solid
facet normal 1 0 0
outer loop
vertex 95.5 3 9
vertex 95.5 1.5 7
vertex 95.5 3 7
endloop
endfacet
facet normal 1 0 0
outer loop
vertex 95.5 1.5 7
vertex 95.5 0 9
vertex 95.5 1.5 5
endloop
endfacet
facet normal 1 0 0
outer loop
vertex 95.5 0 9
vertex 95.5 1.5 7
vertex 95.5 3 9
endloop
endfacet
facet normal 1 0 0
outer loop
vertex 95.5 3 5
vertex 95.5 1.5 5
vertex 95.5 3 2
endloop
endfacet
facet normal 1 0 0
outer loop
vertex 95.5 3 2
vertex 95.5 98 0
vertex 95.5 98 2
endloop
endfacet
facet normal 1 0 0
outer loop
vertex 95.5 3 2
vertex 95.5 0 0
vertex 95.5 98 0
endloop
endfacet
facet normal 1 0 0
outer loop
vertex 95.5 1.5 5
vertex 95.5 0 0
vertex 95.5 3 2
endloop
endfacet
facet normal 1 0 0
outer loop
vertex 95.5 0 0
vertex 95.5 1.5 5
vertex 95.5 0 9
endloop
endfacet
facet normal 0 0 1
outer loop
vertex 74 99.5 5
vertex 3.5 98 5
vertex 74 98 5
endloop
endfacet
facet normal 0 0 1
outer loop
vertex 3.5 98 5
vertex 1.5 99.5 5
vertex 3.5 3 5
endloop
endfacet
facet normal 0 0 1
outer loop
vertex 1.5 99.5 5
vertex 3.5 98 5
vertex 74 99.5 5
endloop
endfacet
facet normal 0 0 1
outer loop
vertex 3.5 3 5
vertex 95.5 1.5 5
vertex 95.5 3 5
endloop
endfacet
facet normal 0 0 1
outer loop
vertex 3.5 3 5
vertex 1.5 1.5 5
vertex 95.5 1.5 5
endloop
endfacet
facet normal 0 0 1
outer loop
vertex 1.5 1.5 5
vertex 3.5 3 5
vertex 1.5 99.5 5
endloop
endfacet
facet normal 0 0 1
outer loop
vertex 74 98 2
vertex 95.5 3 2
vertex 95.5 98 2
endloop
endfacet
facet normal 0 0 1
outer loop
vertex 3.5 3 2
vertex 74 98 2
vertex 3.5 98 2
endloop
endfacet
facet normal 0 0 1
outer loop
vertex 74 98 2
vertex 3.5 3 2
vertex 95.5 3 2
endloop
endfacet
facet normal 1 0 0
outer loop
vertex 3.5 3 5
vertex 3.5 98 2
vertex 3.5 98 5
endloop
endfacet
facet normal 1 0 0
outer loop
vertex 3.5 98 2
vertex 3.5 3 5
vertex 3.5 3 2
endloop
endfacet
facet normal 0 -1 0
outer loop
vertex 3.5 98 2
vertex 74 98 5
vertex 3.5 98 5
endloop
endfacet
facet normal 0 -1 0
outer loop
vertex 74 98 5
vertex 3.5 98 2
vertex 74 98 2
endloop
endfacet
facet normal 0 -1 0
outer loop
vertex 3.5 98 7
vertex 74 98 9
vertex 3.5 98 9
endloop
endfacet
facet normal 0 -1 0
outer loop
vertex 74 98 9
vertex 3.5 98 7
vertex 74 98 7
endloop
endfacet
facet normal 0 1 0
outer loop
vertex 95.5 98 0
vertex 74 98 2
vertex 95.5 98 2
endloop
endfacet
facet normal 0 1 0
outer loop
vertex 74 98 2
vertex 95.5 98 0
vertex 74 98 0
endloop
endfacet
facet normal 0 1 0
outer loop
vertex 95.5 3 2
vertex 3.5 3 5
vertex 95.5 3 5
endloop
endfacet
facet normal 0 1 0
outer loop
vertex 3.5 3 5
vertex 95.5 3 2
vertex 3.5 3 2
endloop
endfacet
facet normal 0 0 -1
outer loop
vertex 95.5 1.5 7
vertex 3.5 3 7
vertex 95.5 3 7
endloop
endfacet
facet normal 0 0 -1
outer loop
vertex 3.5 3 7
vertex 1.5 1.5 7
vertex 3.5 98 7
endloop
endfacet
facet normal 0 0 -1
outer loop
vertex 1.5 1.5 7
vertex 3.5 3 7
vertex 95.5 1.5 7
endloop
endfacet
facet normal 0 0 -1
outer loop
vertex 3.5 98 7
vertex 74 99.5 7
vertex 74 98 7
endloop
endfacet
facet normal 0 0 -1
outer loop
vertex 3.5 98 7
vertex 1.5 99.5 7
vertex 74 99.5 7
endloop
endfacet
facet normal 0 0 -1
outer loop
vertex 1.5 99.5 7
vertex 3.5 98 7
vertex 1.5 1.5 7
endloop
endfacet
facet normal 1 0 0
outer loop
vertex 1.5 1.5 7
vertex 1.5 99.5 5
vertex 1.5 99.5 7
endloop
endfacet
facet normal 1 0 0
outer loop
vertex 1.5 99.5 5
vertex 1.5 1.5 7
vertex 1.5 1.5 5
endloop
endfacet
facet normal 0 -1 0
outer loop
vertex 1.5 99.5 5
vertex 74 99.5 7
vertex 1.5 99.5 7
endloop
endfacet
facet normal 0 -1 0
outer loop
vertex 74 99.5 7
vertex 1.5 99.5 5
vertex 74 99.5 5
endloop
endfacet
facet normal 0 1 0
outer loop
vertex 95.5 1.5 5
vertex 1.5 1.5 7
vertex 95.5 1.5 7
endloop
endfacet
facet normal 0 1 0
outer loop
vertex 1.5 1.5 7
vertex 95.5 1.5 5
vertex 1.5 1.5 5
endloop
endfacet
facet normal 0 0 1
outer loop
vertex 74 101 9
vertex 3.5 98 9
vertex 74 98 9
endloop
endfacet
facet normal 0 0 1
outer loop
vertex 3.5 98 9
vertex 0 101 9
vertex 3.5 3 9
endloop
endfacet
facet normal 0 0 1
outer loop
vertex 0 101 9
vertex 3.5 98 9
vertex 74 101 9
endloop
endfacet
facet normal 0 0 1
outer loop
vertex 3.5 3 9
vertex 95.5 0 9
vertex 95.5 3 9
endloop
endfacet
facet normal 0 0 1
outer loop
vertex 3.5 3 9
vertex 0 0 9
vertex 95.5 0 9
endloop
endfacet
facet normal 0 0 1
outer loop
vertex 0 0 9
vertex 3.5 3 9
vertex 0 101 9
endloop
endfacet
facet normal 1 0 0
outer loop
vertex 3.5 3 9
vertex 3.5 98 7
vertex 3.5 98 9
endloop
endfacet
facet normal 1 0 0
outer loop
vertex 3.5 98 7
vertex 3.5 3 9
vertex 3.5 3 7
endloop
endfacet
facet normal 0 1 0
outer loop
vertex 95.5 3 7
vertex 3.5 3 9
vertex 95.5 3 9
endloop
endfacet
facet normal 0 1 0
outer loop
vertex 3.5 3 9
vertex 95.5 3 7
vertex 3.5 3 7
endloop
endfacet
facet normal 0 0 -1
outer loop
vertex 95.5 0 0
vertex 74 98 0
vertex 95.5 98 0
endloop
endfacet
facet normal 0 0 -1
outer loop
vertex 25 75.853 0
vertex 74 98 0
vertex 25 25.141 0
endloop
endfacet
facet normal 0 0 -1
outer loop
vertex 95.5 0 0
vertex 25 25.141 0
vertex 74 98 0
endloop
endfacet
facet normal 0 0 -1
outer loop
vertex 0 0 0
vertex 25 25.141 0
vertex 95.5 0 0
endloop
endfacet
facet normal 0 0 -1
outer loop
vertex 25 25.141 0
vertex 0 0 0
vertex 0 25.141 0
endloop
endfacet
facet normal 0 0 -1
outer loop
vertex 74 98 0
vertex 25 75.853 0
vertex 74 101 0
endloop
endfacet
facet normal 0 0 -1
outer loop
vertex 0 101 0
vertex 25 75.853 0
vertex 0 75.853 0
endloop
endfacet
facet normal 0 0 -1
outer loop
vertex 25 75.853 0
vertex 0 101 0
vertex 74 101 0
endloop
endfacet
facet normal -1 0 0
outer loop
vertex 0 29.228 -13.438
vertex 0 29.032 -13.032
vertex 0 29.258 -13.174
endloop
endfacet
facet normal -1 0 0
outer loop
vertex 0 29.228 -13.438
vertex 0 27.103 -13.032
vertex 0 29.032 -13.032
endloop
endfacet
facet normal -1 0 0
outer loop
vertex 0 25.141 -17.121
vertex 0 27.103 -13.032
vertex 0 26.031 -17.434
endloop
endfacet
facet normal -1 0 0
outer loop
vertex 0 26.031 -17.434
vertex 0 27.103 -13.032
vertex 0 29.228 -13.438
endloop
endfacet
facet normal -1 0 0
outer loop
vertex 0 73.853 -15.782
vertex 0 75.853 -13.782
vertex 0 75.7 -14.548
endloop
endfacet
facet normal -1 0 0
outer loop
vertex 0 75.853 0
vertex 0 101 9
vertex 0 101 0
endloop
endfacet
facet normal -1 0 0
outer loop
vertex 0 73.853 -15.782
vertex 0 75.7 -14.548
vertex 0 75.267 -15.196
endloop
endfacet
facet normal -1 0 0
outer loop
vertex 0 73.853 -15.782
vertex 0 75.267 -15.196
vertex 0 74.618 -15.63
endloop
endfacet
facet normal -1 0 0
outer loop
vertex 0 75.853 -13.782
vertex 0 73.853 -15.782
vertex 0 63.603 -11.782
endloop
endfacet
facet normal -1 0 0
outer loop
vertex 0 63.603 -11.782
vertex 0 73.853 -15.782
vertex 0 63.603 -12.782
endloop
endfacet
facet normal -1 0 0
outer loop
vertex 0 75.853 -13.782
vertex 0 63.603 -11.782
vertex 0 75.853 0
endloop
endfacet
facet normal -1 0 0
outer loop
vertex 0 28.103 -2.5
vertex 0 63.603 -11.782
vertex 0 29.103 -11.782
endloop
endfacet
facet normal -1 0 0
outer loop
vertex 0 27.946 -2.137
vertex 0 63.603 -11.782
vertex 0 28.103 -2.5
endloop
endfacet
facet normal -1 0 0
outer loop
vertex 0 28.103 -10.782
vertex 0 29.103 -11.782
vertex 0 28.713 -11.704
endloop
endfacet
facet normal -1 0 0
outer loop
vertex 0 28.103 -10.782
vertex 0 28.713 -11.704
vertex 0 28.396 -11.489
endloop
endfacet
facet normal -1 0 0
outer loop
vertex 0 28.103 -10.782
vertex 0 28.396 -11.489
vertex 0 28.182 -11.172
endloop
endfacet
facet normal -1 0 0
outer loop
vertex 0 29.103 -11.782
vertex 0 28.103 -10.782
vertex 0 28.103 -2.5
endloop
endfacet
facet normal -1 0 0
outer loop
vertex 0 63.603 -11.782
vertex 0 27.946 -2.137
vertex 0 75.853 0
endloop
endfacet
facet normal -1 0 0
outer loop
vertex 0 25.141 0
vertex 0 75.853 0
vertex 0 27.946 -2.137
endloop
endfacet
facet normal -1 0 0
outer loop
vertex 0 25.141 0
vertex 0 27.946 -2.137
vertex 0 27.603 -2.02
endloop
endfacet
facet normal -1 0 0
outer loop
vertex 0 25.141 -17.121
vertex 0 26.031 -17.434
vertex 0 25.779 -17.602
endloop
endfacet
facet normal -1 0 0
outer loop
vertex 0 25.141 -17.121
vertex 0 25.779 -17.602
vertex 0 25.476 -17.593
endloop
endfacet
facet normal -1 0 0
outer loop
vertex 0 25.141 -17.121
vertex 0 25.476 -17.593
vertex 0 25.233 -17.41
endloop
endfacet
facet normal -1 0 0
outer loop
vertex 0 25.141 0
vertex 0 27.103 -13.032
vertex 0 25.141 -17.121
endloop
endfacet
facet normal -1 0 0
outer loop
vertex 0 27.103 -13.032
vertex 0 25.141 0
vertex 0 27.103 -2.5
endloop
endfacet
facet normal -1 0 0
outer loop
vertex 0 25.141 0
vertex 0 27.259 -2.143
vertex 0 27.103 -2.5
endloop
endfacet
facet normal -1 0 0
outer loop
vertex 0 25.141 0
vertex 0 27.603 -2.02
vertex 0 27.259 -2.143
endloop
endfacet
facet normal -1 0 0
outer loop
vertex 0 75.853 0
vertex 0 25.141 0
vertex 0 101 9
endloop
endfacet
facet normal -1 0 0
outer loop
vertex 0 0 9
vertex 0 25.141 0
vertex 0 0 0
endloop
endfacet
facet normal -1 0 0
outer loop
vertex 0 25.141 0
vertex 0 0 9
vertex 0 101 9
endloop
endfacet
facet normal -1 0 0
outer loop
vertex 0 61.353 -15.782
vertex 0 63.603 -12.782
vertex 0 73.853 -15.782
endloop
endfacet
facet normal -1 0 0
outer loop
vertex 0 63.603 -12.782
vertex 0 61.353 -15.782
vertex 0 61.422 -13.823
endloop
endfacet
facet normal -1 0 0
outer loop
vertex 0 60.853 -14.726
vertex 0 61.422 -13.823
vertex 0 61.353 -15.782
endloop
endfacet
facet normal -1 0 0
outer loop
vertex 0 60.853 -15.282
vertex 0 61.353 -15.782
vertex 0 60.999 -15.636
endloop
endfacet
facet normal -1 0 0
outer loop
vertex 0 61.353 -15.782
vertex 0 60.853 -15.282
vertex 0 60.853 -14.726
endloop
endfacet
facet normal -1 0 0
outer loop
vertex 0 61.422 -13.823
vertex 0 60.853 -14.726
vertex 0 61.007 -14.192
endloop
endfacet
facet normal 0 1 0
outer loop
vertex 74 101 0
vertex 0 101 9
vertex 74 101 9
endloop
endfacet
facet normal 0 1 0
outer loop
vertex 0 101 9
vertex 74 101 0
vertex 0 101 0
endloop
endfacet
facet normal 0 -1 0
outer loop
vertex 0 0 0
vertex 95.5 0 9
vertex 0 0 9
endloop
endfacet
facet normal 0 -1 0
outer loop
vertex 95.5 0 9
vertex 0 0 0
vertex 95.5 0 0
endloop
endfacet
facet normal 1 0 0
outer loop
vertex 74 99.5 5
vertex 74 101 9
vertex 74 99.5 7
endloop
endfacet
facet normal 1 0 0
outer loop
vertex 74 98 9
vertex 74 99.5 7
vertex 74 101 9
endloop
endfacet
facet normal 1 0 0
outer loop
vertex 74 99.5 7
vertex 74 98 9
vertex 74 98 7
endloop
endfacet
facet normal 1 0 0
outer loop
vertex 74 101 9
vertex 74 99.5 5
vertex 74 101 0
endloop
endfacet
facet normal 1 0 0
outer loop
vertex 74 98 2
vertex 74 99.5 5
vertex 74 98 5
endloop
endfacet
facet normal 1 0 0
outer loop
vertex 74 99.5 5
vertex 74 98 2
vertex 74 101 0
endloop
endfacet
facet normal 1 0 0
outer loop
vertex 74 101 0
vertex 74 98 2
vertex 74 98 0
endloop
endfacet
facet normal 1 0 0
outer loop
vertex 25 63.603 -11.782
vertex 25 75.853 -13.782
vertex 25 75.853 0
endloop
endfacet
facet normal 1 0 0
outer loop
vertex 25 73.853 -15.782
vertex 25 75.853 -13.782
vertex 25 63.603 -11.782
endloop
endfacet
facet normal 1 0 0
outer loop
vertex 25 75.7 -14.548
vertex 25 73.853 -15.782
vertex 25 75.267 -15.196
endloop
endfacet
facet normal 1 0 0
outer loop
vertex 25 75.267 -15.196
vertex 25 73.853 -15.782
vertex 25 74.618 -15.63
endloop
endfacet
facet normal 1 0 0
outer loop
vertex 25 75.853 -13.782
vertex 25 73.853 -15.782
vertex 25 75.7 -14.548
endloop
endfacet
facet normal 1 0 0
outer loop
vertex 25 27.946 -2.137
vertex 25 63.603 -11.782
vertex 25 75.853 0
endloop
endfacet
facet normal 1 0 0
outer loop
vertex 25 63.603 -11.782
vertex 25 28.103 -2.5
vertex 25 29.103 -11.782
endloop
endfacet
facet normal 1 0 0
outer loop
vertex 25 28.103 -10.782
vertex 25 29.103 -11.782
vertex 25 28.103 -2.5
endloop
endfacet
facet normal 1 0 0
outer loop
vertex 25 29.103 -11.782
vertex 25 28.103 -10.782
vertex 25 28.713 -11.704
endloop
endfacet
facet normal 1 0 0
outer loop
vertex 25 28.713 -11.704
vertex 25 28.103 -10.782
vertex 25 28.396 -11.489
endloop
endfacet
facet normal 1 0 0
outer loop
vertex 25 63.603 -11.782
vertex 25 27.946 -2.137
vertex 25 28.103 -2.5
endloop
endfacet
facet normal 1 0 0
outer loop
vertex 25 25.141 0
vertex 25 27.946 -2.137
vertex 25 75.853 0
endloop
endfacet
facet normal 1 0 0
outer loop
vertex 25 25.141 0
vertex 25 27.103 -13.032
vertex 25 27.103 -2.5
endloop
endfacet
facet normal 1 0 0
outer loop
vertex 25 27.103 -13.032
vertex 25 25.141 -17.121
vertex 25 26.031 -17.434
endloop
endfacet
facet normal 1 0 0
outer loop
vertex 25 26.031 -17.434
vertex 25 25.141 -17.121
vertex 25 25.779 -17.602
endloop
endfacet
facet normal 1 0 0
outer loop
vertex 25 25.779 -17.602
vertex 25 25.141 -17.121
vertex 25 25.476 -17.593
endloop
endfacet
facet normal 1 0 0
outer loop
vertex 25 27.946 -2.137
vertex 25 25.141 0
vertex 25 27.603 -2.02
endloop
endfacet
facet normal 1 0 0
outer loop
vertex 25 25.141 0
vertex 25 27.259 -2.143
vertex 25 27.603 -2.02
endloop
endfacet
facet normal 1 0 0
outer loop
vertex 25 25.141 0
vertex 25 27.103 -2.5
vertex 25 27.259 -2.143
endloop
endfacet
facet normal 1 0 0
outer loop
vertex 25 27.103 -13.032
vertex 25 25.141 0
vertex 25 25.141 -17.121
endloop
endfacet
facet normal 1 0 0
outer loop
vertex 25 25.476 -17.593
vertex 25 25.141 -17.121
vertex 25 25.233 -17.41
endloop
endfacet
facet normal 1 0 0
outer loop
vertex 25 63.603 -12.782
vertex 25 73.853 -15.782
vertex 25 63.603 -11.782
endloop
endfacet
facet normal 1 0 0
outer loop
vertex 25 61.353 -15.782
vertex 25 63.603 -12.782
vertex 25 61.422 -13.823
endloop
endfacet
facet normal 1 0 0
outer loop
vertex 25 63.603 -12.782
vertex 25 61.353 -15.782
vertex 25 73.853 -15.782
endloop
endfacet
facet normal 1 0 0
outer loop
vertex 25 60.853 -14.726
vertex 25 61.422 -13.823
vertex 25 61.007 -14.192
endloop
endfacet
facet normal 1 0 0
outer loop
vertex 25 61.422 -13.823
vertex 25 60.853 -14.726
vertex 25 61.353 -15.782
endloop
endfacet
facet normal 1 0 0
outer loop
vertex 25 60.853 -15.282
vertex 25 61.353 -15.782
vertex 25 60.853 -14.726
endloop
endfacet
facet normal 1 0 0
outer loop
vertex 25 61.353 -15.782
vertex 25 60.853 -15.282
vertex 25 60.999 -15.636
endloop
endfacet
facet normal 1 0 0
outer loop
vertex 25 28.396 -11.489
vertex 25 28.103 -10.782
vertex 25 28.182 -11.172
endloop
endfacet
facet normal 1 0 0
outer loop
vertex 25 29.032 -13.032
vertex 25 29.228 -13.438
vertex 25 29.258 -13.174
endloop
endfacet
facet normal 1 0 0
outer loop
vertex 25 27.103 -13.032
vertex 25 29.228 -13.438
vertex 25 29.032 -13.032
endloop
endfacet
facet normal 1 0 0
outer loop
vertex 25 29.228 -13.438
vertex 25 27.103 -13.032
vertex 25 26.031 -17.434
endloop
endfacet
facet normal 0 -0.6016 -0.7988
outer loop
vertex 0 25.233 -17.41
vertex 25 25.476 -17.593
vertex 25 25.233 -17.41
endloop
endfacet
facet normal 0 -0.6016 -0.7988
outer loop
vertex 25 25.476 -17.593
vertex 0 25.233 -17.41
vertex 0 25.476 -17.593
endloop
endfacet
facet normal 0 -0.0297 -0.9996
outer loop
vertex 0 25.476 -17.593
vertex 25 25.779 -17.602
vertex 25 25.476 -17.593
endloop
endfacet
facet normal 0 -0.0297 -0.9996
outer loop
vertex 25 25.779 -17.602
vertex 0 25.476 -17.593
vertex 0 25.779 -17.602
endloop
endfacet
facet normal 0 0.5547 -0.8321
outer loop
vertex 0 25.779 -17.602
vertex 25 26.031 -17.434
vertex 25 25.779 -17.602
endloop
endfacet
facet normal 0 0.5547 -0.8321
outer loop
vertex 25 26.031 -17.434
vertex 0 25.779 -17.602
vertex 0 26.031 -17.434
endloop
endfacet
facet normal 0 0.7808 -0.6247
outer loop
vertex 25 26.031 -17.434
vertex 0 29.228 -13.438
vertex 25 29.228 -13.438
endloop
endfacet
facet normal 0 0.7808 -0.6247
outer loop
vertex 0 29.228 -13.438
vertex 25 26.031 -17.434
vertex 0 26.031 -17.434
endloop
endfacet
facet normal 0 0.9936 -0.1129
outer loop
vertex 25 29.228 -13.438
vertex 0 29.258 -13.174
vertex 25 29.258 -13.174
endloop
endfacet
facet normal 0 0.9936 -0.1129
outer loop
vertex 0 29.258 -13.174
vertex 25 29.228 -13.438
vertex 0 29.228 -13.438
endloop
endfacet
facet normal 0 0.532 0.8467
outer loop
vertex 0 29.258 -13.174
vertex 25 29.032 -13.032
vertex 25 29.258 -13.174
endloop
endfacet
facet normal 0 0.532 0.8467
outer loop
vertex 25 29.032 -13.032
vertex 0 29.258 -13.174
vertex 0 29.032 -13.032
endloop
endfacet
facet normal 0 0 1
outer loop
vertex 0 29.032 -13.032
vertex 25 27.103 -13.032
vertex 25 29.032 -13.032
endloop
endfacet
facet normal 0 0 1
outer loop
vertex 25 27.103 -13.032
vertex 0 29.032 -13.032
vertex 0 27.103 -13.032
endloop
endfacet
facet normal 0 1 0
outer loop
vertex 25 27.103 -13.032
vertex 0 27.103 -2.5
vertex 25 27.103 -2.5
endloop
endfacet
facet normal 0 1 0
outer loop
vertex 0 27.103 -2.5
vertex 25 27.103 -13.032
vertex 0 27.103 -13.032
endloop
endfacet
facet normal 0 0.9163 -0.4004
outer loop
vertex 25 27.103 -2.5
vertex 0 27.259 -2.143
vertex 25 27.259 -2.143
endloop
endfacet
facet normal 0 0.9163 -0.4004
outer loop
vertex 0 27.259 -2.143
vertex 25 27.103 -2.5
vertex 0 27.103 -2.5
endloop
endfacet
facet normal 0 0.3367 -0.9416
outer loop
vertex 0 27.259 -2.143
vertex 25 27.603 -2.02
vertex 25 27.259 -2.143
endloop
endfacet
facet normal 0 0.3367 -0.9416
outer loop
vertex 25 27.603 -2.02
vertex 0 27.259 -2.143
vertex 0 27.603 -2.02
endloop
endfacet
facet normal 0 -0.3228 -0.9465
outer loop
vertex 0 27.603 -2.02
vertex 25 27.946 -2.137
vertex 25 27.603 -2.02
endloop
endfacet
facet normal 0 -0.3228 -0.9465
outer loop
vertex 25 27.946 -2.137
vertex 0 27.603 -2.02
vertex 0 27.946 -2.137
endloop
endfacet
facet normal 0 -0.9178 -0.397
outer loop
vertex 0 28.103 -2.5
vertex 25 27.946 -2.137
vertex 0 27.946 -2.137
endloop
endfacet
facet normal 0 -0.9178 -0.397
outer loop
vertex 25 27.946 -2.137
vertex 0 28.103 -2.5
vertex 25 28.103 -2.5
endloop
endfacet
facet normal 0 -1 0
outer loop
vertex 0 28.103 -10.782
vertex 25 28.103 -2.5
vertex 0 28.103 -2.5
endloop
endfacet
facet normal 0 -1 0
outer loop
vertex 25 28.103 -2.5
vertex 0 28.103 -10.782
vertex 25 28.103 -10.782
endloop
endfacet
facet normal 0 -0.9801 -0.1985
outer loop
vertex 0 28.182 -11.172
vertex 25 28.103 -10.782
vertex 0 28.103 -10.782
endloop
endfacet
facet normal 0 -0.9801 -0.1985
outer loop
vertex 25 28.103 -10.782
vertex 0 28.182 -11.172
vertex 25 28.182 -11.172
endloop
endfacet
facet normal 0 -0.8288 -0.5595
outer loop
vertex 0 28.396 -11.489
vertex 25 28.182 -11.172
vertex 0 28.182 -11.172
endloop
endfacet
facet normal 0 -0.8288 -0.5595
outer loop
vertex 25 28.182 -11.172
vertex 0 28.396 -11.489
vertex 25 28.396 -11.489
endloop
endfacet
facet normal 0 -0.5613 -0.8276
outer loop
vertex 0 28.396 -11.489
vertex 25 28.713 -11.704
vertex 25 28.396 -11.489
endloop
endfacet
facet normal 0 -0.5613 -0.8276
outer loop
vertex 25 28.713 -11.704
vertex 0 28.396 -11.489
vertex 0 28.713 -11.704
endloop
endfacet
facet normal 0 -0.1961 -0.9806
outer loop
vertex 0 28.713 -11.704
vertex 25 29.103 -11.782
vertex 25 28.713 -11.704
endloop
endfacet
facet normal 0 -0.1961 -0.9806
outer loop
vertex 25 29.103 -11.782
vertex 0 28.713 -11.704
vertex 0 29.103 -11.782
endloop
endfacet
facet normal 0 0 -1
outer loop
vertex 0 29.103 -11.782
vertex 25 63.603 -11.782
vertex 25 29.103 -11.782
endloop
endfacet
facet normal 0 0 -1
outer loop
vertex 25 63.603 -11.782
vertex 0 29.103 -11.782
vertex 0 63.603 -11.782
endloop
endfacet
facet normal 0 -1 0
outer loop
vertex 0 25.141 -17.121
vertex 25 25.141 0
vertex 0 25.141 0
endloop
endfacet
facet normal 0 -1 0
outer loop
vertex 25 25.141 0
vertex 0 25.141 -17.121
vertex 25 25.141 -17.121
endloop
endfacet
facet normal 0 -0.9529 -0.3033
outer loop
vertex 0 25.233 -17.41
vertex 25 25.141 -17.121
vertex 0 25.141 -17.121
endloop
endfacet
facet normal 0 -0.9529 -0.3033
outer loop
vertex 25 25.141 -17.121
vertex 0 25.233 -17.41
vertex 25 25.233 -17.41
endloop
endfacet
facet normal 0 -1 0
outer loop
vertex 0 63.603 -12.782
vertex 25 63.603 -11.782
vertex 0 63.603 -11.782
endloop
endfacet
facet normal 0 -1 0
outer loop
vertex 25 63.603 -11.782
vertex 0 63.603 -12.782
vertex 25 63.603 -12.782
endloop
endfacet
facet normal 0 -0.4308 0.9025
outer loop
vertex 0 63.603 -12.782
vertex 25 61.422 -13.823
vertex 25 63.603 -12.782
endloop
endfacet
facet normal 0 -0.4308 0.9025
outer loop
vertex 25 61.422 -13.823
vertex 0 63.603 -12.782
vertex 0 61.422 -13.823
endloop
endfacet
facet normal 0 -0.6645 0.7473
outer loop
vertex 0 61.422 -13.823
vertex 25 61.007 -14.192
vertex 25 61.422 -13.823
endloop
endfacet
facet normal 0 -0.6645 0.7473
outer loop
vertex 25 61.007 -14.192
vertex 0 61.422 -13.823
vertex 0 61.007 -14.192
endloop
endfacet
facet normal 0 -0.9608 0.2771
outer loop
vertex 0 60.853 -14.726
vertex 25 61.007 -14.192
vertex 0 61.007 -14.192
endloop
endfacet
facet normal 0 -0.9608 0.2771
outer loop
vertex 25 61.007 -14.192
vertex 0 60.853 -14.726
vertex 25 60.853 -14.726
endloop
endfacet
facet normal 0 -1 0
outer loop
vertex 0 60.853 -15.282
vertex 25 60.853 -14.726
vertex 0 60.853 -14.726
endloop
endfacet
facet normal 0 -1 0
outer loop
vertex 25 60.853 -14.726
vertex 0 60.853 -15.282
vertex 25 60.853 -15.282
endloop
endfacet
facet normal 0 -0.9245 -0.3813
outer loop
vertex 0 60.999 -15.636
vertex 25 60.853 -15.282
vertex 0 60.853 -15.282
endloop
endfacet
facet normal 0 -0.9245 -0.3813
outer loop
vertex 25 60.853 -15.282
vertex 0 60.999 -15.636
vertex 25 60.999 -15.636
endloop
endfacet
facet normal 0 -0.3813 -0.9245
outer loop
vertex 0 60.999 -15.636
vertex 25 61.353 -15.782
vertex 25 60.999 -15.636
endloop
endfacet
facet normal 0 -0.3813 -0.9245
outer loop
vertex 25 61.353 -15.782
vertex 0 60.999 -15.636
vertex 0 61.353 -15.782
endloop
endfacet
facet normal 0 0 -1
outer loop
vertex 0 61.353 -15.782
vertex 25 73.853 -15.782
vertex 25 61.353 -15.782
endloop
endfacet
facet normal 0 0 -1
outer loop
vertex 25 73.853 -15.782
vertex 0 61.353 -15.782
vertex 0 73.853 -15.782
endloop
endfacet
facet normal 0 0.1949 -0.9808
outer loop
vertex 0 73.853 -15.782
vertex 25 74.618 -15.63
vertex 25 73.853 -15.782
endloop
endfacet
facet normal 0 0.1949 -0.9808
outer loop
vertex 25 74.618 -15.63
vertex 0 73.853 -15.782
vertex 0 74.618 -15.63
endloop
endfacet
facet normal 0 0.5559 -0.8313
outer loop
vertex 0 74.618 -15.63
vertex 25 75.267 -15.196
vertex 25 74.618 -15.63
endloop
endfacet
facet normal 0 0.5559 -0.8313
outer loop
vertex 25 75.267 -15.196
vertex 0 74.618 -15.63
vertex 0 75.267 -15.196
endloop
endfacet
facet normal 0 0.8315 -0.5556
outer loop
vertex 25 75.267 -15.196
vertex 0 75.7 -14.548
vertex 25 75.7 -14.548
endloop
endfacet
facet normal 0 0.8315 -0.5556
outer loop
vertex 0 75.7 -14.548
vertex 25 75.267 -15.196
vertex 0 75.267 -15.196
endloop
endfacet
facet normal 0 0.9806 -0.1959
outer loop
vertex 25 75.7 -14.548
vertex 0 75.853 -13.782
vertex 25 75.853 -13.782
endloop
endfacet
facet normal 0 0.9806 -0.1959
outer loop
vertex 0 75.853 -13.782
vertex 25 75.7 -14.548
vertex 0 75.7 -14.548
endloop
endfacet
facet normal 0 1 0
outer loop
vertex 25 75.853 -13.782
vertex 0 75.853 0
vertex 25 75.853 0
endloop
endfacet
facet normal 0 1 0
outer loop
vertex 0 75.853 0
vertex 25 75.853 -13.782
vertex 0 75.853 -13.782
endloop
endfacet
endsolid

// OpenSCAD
// file: ../library/din_clip_01.scad
CLIP_H = 10;
HOLE_DEPTH = 9;
HOLE_DIAMETER = 2.9;

module din_clip(h=CLIP_H, grow=1) {
        intersection() {
        translate([0,0,-h/2]) cube([20,20,h]);
		linear_extrude(height=h, center=true, convexity=5) {
			import(file="din_clip_01.dxf", layer="0", $fn=64);
		}
    }
        translate([0,grow,0]) intersection() {
        translate([0,20-grow,-h/2]) cube([20,40,h]);
		linear_extrude(height=h, center=true, convexity=5) {
			import(file="din_clip_01.dxf", layer="0", $fn=64);
		}
    }
}

din_clip();
// main file
use <../library/din_clip_01.scad>

PCB_HEIGHT=98;
PCB_WIDTH1=94;
PCB_WIDTH2=96;
PCB_T =2;
PCB_FREE_SPACE=74;
T=2;

module half(width) {
difference() {
    cube([width+1.5,PCB_HEIGHT+3,3+3*T]);
    translate([1.5,1.5,T]) union() { 
        translate([2,1.5,0]) cube([width-2, PCB_HEIGHT-3, 3]);
        translate([0,0,3])cube([width, PCB_HEIGHT, T]);
        translate([2,1.5,3+T]) cube([width-2, PCB_HEIGHT-3, T]);
    }
    translate([PCB_FREE_SPACE,PCB_HEIGHT,0]) cube([width-PCB_FREE_SPACE+1.5,3,3+3*T]);
}
}

half(PCB_WIDTH1);
//translate([0,25,22]) half(PCB_WIDTH1);
//translate([PCB_WIDTH1+PCB_WIDTH2+20,0,0]) mirror([1,0,0]) half(PCB_WIDTH2);
/*
difference() {
cube([T,PCB_HEIGHT+25+3,22+3+3*T]);
color("red") translate([0,0,3+3*T]) rotate([-48.5,0,0]) translate([0,-20,0]) cube([2,20,50]);
color("red") translate([0,PCB_WIDTH2+16.24,-14.97]) rotate([-48.5,0,0]) translate([0,-20,0]) cube([2,20,50]);
}
*/
translate([25/2,25,T]) rotate([0,90,0]) din_clip(h=25);
